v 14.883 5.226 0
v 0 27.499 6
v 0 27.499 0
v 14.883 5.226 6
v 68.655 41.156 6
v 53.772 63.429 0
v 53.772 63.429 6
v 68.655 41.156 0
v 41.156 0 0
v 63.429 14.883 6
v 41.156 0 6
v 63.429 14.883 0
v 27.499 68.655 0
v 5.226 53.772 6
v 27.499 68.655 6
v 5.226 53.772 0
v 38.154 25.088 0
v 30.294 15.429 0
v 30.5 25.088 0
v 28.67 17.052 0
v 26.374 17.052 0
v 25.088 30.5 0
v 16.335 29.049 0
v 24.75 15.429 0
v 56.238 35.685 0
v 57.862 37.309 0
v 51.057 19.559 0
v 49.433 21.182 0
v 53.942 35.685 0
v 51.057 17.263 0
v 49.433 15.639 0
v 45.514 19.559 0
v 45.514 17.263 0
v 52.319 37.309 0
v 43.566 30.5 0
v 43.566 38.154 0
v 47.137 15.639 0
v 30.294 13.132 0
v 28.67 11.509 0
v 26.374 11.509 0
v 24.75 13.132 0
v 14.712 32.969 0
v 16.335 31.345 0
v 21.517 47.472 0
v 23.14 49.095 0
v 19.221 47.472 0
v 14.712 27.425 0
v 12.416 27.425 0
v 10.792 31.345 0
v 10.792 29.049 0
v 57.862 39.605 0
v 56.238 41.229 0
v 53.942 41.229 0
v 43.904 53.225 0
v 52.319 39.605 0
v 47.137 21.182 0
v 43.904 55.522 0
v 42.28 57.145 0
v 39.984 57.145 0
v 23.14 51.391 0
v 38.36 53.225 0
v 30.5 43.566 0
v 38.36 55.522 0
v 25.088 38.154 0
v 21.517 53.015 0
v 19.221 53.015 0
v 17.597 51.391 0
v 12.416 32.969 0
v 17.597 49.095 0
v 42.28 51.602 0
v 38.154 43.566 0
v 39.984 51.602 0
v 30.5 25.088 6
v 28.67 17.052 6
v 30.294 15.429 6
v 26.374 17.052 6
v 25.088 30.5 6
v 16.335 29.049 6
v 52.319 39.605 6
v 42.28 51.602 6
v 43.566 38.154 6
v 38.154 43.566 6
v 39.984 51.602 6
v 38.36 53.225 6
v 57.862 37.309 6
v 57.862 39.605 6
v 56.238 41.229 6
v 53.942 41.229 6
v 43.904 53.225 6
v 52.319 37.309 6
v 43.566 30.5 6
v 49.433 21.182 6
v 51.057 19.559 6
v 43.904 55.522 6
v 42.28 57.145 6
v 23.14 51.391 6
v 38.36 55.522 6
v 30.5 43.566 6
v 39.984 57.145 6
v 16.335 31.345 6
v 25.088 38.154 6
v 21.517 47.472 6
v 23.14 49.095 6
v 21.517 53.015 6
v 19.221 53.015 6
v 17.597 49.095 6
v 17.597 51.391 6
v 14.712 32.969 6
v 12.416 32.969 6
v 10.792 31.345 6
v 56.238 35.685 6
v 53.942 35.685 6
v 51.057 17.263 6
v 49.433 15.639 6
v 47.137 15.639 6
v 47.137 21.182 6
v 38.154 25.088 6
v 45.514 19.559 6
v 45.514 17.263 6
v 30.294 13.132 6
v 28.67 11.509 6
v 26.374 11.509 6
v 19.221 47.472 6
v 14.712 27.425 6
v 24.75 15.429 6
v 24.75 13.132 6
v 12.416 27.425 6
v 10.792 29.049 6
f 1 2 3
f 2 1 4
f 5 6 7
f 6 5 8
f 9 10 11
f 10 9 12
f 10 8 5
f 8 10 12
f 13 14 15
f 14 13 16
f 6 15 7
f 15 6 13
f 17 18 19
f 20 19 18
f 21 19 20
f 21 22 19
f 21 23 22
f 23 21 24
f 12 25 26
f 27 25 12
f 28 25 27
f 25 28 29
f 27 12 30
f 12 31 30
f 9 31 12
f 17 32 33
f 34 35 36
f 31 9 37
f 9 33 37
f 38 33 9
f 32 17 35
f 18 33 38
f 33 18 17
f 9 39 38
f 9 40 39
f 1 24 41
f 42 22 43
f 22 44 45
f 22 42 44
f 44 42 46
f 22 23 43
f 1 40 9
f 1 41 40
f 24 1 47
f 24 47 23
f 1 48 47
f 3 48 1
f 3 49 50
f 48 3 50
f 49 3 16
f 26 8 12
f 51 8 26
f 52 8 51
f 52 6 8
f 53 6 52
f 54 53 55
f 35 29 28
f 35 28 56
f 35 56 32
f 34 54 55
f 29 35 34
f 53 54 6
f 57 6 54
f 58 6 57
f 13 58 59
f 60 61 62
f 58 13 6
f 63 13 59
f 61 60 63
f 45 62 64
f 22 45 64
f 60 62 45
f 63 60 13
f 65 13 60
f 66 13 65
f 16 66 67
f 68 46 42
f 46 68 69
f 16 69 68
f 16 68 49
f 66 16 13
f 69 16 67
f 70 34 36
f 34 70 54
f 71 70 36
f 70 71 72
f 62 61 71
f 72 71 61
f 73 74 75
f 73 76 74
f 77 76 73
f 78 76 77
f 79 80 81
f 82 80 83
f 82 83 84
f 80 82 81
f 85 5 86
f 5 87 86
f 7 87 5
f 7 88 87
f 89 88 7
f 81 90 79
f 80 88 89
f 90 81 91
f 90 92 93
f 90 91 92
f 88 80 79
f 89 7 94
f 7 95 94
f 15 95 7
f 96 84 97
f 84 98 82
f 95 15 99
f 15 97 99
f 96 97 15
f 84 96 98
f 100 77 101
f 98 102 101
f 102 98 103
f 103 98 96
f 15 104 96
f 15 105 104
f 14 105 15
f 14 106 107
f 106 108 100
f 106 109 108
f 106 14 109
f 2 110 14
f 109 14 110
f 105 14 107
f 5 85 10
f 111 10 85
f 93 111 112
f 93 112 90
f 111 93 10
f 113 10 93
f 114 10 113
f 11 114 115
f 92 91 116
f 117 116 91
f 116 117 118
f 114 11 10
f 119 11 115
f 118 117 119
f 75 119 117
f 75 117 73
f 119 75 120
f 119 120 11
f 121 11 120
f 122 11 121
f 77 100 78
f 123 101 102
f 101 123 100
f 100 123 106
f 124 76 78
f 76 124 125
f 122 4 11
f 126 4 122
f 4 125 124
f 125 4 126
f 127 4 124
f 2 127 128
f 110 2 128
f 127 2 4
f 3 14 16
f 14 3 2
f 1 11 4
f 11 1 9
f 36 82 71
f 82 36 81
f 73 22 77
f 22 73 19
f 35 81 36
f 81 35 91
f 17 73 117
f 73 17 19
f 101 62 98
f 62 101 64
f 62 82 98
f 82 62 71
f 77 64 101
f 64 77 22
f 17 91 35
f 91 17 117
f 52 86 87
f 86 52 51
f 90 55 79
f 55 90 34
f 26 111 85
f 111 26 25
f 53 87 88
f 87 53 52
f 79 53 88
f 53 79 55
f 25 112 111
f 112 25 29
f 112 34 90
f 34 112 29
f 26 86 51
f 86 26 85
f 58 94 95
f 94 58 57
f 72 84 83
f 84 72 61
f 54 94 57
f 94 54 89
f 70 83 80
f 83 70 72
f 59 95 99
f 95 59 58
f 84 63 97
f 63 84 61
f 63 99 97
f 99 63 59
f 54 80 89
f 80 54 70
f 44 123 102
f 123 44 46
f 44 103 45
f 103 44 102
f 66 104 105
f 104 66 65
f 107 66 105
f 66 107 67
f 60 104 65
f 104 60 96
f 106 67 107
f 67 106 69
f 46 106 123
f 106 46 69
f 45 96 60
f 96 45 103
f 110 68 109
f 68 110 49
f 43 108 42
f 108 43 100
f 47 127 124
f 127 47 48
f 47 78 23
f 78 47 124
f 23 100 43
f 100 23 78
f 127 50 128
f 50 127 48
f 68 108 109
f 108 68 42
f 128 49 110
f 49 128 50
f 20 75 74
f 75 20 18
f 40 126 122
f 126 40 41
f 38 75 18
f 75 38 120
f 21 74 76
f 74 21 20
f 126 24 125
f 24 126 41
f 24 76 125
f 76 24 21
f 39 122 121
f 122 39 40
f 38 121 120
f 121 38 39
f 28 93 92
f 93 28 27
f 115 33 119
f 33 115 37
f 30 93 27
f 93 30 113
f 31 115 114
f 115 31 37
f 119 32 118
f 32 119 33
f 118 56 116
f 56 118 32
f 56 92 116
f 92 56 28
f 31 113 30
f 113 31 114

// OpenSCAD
$fn = 32;

// ----------------------------------------------------------------------
// Polygon plate: 8-gon R35, 6 bolt windows
// ----------------------------------------------------------------------

// --- parameters (mm) ---
sides = 8;                // number of polygon sides
plate_r = 35;             // circumscribed radius of the polygon
bore_r = 10;              // centre bore radius
bolts = 6;                // number of bolt windows
ring_r = 21.17;           // bolt-circle radius
bolt_r = 3;               // bolt window radius
plate_t = 6;              // plate thickness, Z (extrusion height)

plate_d = 2 * plate_r;  // circumscribed diameter
bore_d = 2 * bore_r;  // centre bore diameter
bolt_d = 2 * bolt_r;  // bolt window diameter
ring_d = 2 * ring_r;  // bolt-circle diameter

profile = [[68.655, 41.156], [53.772, 63.429], [27.499, 68.655], [5.226, 53.772], [0, 27.499], [14.883, 5.226], [41.156, 0], [63.429, 14.883]];  // primary outline, 8 points, counter clockwise
void_1 = [[43.566, 38.154], [38.154, 43.566], [30.5, 43.566], [25.088, 38.154], [25.088, 30.5], [30.5, 25.088], [38.154, 25.088], [43.566, 30.5]];  // centre bore, 8 points
void_2 = [[57.862, 39.605], [56.238, 41.229], [53.942, 41.229], [52.319, 39.605], [52.319, 37.309], [53.942, 35.685], [56.238, 35.685], [57.862, 37.309]];  // bolt window 1, 8 points
void_3 = [[43.904, 55.522], [42.28, 57.145], [39.984, 57.145], [38.36, 55.522], [38.36, 53.225], [39.984, 51.602], [42.28, 51.602], [43.904, 53.225]];  // bolt window 2, 8 points
void_4 = [[23.14, 51.391], [21.517, 53.015], [19.221, 53.015], [17.597, 51.391], [17.597, 49.095], [19.221, 47.472], [21.517, 47.472], [23.14, 49.095]];  // bolt window 3, 8 points
void_5 = [[16.335, 31.345], [14.712, 32.969], [12.416, 32.969], [10.792, 31.345], [10.792, 29.049], [12.416, 27.425], [14.712, 27.425], [16.335, 29.049]];  // bolt window 4, 8 points
void_6 = [[30.294, 15.429], [28.67, 17.052], [26.374, 17.052], [24.75, 15.429], [24.75, 13.132], [26.374, 11.509], [28.67, 11.509], [30.294, 13.132]];  // bolt window 5, 8 points
void_7 = [[51.057, 19.559], [49.433, 21.182], [47.137, 21.182], [45.514, 19.559], [45.514, 17.263], [47.137, 15.639], [49.433, 15.639], [51.057, 17.263]];  // bolt window 6, 8 points

// --- the one profile operation ---
difference() {
  linear_extrude(height = plate_t) polygon(points = profile);
  translate([0, 0, -1])
    linear_extrude(height = plate_t + 2) polygon(points = void_1);
  translate([0, 0, -1])
    linear_extrude(height = plate_t + 2) polygon(points = void_2);
  translate([0, 0, -1])
    linear_extrude(height = plate_t + 2) polygon(points = void_3);
  translate([0, 0, -1])
    linear_extrude(height = plate_t + 2) polygon(points = void_4);
  translate([0, 0, -1])
    linear_extrude(height = plate_t + 2) polygon(points = void_5);
  translate([0, 0, -1])
    linear_extrude(height = plate_t + 2) polygon(points = void_6);
  translate([0, 0, -1])
    linear_extrude(height = plate_t + 2) polygon(points = void_7);
}
